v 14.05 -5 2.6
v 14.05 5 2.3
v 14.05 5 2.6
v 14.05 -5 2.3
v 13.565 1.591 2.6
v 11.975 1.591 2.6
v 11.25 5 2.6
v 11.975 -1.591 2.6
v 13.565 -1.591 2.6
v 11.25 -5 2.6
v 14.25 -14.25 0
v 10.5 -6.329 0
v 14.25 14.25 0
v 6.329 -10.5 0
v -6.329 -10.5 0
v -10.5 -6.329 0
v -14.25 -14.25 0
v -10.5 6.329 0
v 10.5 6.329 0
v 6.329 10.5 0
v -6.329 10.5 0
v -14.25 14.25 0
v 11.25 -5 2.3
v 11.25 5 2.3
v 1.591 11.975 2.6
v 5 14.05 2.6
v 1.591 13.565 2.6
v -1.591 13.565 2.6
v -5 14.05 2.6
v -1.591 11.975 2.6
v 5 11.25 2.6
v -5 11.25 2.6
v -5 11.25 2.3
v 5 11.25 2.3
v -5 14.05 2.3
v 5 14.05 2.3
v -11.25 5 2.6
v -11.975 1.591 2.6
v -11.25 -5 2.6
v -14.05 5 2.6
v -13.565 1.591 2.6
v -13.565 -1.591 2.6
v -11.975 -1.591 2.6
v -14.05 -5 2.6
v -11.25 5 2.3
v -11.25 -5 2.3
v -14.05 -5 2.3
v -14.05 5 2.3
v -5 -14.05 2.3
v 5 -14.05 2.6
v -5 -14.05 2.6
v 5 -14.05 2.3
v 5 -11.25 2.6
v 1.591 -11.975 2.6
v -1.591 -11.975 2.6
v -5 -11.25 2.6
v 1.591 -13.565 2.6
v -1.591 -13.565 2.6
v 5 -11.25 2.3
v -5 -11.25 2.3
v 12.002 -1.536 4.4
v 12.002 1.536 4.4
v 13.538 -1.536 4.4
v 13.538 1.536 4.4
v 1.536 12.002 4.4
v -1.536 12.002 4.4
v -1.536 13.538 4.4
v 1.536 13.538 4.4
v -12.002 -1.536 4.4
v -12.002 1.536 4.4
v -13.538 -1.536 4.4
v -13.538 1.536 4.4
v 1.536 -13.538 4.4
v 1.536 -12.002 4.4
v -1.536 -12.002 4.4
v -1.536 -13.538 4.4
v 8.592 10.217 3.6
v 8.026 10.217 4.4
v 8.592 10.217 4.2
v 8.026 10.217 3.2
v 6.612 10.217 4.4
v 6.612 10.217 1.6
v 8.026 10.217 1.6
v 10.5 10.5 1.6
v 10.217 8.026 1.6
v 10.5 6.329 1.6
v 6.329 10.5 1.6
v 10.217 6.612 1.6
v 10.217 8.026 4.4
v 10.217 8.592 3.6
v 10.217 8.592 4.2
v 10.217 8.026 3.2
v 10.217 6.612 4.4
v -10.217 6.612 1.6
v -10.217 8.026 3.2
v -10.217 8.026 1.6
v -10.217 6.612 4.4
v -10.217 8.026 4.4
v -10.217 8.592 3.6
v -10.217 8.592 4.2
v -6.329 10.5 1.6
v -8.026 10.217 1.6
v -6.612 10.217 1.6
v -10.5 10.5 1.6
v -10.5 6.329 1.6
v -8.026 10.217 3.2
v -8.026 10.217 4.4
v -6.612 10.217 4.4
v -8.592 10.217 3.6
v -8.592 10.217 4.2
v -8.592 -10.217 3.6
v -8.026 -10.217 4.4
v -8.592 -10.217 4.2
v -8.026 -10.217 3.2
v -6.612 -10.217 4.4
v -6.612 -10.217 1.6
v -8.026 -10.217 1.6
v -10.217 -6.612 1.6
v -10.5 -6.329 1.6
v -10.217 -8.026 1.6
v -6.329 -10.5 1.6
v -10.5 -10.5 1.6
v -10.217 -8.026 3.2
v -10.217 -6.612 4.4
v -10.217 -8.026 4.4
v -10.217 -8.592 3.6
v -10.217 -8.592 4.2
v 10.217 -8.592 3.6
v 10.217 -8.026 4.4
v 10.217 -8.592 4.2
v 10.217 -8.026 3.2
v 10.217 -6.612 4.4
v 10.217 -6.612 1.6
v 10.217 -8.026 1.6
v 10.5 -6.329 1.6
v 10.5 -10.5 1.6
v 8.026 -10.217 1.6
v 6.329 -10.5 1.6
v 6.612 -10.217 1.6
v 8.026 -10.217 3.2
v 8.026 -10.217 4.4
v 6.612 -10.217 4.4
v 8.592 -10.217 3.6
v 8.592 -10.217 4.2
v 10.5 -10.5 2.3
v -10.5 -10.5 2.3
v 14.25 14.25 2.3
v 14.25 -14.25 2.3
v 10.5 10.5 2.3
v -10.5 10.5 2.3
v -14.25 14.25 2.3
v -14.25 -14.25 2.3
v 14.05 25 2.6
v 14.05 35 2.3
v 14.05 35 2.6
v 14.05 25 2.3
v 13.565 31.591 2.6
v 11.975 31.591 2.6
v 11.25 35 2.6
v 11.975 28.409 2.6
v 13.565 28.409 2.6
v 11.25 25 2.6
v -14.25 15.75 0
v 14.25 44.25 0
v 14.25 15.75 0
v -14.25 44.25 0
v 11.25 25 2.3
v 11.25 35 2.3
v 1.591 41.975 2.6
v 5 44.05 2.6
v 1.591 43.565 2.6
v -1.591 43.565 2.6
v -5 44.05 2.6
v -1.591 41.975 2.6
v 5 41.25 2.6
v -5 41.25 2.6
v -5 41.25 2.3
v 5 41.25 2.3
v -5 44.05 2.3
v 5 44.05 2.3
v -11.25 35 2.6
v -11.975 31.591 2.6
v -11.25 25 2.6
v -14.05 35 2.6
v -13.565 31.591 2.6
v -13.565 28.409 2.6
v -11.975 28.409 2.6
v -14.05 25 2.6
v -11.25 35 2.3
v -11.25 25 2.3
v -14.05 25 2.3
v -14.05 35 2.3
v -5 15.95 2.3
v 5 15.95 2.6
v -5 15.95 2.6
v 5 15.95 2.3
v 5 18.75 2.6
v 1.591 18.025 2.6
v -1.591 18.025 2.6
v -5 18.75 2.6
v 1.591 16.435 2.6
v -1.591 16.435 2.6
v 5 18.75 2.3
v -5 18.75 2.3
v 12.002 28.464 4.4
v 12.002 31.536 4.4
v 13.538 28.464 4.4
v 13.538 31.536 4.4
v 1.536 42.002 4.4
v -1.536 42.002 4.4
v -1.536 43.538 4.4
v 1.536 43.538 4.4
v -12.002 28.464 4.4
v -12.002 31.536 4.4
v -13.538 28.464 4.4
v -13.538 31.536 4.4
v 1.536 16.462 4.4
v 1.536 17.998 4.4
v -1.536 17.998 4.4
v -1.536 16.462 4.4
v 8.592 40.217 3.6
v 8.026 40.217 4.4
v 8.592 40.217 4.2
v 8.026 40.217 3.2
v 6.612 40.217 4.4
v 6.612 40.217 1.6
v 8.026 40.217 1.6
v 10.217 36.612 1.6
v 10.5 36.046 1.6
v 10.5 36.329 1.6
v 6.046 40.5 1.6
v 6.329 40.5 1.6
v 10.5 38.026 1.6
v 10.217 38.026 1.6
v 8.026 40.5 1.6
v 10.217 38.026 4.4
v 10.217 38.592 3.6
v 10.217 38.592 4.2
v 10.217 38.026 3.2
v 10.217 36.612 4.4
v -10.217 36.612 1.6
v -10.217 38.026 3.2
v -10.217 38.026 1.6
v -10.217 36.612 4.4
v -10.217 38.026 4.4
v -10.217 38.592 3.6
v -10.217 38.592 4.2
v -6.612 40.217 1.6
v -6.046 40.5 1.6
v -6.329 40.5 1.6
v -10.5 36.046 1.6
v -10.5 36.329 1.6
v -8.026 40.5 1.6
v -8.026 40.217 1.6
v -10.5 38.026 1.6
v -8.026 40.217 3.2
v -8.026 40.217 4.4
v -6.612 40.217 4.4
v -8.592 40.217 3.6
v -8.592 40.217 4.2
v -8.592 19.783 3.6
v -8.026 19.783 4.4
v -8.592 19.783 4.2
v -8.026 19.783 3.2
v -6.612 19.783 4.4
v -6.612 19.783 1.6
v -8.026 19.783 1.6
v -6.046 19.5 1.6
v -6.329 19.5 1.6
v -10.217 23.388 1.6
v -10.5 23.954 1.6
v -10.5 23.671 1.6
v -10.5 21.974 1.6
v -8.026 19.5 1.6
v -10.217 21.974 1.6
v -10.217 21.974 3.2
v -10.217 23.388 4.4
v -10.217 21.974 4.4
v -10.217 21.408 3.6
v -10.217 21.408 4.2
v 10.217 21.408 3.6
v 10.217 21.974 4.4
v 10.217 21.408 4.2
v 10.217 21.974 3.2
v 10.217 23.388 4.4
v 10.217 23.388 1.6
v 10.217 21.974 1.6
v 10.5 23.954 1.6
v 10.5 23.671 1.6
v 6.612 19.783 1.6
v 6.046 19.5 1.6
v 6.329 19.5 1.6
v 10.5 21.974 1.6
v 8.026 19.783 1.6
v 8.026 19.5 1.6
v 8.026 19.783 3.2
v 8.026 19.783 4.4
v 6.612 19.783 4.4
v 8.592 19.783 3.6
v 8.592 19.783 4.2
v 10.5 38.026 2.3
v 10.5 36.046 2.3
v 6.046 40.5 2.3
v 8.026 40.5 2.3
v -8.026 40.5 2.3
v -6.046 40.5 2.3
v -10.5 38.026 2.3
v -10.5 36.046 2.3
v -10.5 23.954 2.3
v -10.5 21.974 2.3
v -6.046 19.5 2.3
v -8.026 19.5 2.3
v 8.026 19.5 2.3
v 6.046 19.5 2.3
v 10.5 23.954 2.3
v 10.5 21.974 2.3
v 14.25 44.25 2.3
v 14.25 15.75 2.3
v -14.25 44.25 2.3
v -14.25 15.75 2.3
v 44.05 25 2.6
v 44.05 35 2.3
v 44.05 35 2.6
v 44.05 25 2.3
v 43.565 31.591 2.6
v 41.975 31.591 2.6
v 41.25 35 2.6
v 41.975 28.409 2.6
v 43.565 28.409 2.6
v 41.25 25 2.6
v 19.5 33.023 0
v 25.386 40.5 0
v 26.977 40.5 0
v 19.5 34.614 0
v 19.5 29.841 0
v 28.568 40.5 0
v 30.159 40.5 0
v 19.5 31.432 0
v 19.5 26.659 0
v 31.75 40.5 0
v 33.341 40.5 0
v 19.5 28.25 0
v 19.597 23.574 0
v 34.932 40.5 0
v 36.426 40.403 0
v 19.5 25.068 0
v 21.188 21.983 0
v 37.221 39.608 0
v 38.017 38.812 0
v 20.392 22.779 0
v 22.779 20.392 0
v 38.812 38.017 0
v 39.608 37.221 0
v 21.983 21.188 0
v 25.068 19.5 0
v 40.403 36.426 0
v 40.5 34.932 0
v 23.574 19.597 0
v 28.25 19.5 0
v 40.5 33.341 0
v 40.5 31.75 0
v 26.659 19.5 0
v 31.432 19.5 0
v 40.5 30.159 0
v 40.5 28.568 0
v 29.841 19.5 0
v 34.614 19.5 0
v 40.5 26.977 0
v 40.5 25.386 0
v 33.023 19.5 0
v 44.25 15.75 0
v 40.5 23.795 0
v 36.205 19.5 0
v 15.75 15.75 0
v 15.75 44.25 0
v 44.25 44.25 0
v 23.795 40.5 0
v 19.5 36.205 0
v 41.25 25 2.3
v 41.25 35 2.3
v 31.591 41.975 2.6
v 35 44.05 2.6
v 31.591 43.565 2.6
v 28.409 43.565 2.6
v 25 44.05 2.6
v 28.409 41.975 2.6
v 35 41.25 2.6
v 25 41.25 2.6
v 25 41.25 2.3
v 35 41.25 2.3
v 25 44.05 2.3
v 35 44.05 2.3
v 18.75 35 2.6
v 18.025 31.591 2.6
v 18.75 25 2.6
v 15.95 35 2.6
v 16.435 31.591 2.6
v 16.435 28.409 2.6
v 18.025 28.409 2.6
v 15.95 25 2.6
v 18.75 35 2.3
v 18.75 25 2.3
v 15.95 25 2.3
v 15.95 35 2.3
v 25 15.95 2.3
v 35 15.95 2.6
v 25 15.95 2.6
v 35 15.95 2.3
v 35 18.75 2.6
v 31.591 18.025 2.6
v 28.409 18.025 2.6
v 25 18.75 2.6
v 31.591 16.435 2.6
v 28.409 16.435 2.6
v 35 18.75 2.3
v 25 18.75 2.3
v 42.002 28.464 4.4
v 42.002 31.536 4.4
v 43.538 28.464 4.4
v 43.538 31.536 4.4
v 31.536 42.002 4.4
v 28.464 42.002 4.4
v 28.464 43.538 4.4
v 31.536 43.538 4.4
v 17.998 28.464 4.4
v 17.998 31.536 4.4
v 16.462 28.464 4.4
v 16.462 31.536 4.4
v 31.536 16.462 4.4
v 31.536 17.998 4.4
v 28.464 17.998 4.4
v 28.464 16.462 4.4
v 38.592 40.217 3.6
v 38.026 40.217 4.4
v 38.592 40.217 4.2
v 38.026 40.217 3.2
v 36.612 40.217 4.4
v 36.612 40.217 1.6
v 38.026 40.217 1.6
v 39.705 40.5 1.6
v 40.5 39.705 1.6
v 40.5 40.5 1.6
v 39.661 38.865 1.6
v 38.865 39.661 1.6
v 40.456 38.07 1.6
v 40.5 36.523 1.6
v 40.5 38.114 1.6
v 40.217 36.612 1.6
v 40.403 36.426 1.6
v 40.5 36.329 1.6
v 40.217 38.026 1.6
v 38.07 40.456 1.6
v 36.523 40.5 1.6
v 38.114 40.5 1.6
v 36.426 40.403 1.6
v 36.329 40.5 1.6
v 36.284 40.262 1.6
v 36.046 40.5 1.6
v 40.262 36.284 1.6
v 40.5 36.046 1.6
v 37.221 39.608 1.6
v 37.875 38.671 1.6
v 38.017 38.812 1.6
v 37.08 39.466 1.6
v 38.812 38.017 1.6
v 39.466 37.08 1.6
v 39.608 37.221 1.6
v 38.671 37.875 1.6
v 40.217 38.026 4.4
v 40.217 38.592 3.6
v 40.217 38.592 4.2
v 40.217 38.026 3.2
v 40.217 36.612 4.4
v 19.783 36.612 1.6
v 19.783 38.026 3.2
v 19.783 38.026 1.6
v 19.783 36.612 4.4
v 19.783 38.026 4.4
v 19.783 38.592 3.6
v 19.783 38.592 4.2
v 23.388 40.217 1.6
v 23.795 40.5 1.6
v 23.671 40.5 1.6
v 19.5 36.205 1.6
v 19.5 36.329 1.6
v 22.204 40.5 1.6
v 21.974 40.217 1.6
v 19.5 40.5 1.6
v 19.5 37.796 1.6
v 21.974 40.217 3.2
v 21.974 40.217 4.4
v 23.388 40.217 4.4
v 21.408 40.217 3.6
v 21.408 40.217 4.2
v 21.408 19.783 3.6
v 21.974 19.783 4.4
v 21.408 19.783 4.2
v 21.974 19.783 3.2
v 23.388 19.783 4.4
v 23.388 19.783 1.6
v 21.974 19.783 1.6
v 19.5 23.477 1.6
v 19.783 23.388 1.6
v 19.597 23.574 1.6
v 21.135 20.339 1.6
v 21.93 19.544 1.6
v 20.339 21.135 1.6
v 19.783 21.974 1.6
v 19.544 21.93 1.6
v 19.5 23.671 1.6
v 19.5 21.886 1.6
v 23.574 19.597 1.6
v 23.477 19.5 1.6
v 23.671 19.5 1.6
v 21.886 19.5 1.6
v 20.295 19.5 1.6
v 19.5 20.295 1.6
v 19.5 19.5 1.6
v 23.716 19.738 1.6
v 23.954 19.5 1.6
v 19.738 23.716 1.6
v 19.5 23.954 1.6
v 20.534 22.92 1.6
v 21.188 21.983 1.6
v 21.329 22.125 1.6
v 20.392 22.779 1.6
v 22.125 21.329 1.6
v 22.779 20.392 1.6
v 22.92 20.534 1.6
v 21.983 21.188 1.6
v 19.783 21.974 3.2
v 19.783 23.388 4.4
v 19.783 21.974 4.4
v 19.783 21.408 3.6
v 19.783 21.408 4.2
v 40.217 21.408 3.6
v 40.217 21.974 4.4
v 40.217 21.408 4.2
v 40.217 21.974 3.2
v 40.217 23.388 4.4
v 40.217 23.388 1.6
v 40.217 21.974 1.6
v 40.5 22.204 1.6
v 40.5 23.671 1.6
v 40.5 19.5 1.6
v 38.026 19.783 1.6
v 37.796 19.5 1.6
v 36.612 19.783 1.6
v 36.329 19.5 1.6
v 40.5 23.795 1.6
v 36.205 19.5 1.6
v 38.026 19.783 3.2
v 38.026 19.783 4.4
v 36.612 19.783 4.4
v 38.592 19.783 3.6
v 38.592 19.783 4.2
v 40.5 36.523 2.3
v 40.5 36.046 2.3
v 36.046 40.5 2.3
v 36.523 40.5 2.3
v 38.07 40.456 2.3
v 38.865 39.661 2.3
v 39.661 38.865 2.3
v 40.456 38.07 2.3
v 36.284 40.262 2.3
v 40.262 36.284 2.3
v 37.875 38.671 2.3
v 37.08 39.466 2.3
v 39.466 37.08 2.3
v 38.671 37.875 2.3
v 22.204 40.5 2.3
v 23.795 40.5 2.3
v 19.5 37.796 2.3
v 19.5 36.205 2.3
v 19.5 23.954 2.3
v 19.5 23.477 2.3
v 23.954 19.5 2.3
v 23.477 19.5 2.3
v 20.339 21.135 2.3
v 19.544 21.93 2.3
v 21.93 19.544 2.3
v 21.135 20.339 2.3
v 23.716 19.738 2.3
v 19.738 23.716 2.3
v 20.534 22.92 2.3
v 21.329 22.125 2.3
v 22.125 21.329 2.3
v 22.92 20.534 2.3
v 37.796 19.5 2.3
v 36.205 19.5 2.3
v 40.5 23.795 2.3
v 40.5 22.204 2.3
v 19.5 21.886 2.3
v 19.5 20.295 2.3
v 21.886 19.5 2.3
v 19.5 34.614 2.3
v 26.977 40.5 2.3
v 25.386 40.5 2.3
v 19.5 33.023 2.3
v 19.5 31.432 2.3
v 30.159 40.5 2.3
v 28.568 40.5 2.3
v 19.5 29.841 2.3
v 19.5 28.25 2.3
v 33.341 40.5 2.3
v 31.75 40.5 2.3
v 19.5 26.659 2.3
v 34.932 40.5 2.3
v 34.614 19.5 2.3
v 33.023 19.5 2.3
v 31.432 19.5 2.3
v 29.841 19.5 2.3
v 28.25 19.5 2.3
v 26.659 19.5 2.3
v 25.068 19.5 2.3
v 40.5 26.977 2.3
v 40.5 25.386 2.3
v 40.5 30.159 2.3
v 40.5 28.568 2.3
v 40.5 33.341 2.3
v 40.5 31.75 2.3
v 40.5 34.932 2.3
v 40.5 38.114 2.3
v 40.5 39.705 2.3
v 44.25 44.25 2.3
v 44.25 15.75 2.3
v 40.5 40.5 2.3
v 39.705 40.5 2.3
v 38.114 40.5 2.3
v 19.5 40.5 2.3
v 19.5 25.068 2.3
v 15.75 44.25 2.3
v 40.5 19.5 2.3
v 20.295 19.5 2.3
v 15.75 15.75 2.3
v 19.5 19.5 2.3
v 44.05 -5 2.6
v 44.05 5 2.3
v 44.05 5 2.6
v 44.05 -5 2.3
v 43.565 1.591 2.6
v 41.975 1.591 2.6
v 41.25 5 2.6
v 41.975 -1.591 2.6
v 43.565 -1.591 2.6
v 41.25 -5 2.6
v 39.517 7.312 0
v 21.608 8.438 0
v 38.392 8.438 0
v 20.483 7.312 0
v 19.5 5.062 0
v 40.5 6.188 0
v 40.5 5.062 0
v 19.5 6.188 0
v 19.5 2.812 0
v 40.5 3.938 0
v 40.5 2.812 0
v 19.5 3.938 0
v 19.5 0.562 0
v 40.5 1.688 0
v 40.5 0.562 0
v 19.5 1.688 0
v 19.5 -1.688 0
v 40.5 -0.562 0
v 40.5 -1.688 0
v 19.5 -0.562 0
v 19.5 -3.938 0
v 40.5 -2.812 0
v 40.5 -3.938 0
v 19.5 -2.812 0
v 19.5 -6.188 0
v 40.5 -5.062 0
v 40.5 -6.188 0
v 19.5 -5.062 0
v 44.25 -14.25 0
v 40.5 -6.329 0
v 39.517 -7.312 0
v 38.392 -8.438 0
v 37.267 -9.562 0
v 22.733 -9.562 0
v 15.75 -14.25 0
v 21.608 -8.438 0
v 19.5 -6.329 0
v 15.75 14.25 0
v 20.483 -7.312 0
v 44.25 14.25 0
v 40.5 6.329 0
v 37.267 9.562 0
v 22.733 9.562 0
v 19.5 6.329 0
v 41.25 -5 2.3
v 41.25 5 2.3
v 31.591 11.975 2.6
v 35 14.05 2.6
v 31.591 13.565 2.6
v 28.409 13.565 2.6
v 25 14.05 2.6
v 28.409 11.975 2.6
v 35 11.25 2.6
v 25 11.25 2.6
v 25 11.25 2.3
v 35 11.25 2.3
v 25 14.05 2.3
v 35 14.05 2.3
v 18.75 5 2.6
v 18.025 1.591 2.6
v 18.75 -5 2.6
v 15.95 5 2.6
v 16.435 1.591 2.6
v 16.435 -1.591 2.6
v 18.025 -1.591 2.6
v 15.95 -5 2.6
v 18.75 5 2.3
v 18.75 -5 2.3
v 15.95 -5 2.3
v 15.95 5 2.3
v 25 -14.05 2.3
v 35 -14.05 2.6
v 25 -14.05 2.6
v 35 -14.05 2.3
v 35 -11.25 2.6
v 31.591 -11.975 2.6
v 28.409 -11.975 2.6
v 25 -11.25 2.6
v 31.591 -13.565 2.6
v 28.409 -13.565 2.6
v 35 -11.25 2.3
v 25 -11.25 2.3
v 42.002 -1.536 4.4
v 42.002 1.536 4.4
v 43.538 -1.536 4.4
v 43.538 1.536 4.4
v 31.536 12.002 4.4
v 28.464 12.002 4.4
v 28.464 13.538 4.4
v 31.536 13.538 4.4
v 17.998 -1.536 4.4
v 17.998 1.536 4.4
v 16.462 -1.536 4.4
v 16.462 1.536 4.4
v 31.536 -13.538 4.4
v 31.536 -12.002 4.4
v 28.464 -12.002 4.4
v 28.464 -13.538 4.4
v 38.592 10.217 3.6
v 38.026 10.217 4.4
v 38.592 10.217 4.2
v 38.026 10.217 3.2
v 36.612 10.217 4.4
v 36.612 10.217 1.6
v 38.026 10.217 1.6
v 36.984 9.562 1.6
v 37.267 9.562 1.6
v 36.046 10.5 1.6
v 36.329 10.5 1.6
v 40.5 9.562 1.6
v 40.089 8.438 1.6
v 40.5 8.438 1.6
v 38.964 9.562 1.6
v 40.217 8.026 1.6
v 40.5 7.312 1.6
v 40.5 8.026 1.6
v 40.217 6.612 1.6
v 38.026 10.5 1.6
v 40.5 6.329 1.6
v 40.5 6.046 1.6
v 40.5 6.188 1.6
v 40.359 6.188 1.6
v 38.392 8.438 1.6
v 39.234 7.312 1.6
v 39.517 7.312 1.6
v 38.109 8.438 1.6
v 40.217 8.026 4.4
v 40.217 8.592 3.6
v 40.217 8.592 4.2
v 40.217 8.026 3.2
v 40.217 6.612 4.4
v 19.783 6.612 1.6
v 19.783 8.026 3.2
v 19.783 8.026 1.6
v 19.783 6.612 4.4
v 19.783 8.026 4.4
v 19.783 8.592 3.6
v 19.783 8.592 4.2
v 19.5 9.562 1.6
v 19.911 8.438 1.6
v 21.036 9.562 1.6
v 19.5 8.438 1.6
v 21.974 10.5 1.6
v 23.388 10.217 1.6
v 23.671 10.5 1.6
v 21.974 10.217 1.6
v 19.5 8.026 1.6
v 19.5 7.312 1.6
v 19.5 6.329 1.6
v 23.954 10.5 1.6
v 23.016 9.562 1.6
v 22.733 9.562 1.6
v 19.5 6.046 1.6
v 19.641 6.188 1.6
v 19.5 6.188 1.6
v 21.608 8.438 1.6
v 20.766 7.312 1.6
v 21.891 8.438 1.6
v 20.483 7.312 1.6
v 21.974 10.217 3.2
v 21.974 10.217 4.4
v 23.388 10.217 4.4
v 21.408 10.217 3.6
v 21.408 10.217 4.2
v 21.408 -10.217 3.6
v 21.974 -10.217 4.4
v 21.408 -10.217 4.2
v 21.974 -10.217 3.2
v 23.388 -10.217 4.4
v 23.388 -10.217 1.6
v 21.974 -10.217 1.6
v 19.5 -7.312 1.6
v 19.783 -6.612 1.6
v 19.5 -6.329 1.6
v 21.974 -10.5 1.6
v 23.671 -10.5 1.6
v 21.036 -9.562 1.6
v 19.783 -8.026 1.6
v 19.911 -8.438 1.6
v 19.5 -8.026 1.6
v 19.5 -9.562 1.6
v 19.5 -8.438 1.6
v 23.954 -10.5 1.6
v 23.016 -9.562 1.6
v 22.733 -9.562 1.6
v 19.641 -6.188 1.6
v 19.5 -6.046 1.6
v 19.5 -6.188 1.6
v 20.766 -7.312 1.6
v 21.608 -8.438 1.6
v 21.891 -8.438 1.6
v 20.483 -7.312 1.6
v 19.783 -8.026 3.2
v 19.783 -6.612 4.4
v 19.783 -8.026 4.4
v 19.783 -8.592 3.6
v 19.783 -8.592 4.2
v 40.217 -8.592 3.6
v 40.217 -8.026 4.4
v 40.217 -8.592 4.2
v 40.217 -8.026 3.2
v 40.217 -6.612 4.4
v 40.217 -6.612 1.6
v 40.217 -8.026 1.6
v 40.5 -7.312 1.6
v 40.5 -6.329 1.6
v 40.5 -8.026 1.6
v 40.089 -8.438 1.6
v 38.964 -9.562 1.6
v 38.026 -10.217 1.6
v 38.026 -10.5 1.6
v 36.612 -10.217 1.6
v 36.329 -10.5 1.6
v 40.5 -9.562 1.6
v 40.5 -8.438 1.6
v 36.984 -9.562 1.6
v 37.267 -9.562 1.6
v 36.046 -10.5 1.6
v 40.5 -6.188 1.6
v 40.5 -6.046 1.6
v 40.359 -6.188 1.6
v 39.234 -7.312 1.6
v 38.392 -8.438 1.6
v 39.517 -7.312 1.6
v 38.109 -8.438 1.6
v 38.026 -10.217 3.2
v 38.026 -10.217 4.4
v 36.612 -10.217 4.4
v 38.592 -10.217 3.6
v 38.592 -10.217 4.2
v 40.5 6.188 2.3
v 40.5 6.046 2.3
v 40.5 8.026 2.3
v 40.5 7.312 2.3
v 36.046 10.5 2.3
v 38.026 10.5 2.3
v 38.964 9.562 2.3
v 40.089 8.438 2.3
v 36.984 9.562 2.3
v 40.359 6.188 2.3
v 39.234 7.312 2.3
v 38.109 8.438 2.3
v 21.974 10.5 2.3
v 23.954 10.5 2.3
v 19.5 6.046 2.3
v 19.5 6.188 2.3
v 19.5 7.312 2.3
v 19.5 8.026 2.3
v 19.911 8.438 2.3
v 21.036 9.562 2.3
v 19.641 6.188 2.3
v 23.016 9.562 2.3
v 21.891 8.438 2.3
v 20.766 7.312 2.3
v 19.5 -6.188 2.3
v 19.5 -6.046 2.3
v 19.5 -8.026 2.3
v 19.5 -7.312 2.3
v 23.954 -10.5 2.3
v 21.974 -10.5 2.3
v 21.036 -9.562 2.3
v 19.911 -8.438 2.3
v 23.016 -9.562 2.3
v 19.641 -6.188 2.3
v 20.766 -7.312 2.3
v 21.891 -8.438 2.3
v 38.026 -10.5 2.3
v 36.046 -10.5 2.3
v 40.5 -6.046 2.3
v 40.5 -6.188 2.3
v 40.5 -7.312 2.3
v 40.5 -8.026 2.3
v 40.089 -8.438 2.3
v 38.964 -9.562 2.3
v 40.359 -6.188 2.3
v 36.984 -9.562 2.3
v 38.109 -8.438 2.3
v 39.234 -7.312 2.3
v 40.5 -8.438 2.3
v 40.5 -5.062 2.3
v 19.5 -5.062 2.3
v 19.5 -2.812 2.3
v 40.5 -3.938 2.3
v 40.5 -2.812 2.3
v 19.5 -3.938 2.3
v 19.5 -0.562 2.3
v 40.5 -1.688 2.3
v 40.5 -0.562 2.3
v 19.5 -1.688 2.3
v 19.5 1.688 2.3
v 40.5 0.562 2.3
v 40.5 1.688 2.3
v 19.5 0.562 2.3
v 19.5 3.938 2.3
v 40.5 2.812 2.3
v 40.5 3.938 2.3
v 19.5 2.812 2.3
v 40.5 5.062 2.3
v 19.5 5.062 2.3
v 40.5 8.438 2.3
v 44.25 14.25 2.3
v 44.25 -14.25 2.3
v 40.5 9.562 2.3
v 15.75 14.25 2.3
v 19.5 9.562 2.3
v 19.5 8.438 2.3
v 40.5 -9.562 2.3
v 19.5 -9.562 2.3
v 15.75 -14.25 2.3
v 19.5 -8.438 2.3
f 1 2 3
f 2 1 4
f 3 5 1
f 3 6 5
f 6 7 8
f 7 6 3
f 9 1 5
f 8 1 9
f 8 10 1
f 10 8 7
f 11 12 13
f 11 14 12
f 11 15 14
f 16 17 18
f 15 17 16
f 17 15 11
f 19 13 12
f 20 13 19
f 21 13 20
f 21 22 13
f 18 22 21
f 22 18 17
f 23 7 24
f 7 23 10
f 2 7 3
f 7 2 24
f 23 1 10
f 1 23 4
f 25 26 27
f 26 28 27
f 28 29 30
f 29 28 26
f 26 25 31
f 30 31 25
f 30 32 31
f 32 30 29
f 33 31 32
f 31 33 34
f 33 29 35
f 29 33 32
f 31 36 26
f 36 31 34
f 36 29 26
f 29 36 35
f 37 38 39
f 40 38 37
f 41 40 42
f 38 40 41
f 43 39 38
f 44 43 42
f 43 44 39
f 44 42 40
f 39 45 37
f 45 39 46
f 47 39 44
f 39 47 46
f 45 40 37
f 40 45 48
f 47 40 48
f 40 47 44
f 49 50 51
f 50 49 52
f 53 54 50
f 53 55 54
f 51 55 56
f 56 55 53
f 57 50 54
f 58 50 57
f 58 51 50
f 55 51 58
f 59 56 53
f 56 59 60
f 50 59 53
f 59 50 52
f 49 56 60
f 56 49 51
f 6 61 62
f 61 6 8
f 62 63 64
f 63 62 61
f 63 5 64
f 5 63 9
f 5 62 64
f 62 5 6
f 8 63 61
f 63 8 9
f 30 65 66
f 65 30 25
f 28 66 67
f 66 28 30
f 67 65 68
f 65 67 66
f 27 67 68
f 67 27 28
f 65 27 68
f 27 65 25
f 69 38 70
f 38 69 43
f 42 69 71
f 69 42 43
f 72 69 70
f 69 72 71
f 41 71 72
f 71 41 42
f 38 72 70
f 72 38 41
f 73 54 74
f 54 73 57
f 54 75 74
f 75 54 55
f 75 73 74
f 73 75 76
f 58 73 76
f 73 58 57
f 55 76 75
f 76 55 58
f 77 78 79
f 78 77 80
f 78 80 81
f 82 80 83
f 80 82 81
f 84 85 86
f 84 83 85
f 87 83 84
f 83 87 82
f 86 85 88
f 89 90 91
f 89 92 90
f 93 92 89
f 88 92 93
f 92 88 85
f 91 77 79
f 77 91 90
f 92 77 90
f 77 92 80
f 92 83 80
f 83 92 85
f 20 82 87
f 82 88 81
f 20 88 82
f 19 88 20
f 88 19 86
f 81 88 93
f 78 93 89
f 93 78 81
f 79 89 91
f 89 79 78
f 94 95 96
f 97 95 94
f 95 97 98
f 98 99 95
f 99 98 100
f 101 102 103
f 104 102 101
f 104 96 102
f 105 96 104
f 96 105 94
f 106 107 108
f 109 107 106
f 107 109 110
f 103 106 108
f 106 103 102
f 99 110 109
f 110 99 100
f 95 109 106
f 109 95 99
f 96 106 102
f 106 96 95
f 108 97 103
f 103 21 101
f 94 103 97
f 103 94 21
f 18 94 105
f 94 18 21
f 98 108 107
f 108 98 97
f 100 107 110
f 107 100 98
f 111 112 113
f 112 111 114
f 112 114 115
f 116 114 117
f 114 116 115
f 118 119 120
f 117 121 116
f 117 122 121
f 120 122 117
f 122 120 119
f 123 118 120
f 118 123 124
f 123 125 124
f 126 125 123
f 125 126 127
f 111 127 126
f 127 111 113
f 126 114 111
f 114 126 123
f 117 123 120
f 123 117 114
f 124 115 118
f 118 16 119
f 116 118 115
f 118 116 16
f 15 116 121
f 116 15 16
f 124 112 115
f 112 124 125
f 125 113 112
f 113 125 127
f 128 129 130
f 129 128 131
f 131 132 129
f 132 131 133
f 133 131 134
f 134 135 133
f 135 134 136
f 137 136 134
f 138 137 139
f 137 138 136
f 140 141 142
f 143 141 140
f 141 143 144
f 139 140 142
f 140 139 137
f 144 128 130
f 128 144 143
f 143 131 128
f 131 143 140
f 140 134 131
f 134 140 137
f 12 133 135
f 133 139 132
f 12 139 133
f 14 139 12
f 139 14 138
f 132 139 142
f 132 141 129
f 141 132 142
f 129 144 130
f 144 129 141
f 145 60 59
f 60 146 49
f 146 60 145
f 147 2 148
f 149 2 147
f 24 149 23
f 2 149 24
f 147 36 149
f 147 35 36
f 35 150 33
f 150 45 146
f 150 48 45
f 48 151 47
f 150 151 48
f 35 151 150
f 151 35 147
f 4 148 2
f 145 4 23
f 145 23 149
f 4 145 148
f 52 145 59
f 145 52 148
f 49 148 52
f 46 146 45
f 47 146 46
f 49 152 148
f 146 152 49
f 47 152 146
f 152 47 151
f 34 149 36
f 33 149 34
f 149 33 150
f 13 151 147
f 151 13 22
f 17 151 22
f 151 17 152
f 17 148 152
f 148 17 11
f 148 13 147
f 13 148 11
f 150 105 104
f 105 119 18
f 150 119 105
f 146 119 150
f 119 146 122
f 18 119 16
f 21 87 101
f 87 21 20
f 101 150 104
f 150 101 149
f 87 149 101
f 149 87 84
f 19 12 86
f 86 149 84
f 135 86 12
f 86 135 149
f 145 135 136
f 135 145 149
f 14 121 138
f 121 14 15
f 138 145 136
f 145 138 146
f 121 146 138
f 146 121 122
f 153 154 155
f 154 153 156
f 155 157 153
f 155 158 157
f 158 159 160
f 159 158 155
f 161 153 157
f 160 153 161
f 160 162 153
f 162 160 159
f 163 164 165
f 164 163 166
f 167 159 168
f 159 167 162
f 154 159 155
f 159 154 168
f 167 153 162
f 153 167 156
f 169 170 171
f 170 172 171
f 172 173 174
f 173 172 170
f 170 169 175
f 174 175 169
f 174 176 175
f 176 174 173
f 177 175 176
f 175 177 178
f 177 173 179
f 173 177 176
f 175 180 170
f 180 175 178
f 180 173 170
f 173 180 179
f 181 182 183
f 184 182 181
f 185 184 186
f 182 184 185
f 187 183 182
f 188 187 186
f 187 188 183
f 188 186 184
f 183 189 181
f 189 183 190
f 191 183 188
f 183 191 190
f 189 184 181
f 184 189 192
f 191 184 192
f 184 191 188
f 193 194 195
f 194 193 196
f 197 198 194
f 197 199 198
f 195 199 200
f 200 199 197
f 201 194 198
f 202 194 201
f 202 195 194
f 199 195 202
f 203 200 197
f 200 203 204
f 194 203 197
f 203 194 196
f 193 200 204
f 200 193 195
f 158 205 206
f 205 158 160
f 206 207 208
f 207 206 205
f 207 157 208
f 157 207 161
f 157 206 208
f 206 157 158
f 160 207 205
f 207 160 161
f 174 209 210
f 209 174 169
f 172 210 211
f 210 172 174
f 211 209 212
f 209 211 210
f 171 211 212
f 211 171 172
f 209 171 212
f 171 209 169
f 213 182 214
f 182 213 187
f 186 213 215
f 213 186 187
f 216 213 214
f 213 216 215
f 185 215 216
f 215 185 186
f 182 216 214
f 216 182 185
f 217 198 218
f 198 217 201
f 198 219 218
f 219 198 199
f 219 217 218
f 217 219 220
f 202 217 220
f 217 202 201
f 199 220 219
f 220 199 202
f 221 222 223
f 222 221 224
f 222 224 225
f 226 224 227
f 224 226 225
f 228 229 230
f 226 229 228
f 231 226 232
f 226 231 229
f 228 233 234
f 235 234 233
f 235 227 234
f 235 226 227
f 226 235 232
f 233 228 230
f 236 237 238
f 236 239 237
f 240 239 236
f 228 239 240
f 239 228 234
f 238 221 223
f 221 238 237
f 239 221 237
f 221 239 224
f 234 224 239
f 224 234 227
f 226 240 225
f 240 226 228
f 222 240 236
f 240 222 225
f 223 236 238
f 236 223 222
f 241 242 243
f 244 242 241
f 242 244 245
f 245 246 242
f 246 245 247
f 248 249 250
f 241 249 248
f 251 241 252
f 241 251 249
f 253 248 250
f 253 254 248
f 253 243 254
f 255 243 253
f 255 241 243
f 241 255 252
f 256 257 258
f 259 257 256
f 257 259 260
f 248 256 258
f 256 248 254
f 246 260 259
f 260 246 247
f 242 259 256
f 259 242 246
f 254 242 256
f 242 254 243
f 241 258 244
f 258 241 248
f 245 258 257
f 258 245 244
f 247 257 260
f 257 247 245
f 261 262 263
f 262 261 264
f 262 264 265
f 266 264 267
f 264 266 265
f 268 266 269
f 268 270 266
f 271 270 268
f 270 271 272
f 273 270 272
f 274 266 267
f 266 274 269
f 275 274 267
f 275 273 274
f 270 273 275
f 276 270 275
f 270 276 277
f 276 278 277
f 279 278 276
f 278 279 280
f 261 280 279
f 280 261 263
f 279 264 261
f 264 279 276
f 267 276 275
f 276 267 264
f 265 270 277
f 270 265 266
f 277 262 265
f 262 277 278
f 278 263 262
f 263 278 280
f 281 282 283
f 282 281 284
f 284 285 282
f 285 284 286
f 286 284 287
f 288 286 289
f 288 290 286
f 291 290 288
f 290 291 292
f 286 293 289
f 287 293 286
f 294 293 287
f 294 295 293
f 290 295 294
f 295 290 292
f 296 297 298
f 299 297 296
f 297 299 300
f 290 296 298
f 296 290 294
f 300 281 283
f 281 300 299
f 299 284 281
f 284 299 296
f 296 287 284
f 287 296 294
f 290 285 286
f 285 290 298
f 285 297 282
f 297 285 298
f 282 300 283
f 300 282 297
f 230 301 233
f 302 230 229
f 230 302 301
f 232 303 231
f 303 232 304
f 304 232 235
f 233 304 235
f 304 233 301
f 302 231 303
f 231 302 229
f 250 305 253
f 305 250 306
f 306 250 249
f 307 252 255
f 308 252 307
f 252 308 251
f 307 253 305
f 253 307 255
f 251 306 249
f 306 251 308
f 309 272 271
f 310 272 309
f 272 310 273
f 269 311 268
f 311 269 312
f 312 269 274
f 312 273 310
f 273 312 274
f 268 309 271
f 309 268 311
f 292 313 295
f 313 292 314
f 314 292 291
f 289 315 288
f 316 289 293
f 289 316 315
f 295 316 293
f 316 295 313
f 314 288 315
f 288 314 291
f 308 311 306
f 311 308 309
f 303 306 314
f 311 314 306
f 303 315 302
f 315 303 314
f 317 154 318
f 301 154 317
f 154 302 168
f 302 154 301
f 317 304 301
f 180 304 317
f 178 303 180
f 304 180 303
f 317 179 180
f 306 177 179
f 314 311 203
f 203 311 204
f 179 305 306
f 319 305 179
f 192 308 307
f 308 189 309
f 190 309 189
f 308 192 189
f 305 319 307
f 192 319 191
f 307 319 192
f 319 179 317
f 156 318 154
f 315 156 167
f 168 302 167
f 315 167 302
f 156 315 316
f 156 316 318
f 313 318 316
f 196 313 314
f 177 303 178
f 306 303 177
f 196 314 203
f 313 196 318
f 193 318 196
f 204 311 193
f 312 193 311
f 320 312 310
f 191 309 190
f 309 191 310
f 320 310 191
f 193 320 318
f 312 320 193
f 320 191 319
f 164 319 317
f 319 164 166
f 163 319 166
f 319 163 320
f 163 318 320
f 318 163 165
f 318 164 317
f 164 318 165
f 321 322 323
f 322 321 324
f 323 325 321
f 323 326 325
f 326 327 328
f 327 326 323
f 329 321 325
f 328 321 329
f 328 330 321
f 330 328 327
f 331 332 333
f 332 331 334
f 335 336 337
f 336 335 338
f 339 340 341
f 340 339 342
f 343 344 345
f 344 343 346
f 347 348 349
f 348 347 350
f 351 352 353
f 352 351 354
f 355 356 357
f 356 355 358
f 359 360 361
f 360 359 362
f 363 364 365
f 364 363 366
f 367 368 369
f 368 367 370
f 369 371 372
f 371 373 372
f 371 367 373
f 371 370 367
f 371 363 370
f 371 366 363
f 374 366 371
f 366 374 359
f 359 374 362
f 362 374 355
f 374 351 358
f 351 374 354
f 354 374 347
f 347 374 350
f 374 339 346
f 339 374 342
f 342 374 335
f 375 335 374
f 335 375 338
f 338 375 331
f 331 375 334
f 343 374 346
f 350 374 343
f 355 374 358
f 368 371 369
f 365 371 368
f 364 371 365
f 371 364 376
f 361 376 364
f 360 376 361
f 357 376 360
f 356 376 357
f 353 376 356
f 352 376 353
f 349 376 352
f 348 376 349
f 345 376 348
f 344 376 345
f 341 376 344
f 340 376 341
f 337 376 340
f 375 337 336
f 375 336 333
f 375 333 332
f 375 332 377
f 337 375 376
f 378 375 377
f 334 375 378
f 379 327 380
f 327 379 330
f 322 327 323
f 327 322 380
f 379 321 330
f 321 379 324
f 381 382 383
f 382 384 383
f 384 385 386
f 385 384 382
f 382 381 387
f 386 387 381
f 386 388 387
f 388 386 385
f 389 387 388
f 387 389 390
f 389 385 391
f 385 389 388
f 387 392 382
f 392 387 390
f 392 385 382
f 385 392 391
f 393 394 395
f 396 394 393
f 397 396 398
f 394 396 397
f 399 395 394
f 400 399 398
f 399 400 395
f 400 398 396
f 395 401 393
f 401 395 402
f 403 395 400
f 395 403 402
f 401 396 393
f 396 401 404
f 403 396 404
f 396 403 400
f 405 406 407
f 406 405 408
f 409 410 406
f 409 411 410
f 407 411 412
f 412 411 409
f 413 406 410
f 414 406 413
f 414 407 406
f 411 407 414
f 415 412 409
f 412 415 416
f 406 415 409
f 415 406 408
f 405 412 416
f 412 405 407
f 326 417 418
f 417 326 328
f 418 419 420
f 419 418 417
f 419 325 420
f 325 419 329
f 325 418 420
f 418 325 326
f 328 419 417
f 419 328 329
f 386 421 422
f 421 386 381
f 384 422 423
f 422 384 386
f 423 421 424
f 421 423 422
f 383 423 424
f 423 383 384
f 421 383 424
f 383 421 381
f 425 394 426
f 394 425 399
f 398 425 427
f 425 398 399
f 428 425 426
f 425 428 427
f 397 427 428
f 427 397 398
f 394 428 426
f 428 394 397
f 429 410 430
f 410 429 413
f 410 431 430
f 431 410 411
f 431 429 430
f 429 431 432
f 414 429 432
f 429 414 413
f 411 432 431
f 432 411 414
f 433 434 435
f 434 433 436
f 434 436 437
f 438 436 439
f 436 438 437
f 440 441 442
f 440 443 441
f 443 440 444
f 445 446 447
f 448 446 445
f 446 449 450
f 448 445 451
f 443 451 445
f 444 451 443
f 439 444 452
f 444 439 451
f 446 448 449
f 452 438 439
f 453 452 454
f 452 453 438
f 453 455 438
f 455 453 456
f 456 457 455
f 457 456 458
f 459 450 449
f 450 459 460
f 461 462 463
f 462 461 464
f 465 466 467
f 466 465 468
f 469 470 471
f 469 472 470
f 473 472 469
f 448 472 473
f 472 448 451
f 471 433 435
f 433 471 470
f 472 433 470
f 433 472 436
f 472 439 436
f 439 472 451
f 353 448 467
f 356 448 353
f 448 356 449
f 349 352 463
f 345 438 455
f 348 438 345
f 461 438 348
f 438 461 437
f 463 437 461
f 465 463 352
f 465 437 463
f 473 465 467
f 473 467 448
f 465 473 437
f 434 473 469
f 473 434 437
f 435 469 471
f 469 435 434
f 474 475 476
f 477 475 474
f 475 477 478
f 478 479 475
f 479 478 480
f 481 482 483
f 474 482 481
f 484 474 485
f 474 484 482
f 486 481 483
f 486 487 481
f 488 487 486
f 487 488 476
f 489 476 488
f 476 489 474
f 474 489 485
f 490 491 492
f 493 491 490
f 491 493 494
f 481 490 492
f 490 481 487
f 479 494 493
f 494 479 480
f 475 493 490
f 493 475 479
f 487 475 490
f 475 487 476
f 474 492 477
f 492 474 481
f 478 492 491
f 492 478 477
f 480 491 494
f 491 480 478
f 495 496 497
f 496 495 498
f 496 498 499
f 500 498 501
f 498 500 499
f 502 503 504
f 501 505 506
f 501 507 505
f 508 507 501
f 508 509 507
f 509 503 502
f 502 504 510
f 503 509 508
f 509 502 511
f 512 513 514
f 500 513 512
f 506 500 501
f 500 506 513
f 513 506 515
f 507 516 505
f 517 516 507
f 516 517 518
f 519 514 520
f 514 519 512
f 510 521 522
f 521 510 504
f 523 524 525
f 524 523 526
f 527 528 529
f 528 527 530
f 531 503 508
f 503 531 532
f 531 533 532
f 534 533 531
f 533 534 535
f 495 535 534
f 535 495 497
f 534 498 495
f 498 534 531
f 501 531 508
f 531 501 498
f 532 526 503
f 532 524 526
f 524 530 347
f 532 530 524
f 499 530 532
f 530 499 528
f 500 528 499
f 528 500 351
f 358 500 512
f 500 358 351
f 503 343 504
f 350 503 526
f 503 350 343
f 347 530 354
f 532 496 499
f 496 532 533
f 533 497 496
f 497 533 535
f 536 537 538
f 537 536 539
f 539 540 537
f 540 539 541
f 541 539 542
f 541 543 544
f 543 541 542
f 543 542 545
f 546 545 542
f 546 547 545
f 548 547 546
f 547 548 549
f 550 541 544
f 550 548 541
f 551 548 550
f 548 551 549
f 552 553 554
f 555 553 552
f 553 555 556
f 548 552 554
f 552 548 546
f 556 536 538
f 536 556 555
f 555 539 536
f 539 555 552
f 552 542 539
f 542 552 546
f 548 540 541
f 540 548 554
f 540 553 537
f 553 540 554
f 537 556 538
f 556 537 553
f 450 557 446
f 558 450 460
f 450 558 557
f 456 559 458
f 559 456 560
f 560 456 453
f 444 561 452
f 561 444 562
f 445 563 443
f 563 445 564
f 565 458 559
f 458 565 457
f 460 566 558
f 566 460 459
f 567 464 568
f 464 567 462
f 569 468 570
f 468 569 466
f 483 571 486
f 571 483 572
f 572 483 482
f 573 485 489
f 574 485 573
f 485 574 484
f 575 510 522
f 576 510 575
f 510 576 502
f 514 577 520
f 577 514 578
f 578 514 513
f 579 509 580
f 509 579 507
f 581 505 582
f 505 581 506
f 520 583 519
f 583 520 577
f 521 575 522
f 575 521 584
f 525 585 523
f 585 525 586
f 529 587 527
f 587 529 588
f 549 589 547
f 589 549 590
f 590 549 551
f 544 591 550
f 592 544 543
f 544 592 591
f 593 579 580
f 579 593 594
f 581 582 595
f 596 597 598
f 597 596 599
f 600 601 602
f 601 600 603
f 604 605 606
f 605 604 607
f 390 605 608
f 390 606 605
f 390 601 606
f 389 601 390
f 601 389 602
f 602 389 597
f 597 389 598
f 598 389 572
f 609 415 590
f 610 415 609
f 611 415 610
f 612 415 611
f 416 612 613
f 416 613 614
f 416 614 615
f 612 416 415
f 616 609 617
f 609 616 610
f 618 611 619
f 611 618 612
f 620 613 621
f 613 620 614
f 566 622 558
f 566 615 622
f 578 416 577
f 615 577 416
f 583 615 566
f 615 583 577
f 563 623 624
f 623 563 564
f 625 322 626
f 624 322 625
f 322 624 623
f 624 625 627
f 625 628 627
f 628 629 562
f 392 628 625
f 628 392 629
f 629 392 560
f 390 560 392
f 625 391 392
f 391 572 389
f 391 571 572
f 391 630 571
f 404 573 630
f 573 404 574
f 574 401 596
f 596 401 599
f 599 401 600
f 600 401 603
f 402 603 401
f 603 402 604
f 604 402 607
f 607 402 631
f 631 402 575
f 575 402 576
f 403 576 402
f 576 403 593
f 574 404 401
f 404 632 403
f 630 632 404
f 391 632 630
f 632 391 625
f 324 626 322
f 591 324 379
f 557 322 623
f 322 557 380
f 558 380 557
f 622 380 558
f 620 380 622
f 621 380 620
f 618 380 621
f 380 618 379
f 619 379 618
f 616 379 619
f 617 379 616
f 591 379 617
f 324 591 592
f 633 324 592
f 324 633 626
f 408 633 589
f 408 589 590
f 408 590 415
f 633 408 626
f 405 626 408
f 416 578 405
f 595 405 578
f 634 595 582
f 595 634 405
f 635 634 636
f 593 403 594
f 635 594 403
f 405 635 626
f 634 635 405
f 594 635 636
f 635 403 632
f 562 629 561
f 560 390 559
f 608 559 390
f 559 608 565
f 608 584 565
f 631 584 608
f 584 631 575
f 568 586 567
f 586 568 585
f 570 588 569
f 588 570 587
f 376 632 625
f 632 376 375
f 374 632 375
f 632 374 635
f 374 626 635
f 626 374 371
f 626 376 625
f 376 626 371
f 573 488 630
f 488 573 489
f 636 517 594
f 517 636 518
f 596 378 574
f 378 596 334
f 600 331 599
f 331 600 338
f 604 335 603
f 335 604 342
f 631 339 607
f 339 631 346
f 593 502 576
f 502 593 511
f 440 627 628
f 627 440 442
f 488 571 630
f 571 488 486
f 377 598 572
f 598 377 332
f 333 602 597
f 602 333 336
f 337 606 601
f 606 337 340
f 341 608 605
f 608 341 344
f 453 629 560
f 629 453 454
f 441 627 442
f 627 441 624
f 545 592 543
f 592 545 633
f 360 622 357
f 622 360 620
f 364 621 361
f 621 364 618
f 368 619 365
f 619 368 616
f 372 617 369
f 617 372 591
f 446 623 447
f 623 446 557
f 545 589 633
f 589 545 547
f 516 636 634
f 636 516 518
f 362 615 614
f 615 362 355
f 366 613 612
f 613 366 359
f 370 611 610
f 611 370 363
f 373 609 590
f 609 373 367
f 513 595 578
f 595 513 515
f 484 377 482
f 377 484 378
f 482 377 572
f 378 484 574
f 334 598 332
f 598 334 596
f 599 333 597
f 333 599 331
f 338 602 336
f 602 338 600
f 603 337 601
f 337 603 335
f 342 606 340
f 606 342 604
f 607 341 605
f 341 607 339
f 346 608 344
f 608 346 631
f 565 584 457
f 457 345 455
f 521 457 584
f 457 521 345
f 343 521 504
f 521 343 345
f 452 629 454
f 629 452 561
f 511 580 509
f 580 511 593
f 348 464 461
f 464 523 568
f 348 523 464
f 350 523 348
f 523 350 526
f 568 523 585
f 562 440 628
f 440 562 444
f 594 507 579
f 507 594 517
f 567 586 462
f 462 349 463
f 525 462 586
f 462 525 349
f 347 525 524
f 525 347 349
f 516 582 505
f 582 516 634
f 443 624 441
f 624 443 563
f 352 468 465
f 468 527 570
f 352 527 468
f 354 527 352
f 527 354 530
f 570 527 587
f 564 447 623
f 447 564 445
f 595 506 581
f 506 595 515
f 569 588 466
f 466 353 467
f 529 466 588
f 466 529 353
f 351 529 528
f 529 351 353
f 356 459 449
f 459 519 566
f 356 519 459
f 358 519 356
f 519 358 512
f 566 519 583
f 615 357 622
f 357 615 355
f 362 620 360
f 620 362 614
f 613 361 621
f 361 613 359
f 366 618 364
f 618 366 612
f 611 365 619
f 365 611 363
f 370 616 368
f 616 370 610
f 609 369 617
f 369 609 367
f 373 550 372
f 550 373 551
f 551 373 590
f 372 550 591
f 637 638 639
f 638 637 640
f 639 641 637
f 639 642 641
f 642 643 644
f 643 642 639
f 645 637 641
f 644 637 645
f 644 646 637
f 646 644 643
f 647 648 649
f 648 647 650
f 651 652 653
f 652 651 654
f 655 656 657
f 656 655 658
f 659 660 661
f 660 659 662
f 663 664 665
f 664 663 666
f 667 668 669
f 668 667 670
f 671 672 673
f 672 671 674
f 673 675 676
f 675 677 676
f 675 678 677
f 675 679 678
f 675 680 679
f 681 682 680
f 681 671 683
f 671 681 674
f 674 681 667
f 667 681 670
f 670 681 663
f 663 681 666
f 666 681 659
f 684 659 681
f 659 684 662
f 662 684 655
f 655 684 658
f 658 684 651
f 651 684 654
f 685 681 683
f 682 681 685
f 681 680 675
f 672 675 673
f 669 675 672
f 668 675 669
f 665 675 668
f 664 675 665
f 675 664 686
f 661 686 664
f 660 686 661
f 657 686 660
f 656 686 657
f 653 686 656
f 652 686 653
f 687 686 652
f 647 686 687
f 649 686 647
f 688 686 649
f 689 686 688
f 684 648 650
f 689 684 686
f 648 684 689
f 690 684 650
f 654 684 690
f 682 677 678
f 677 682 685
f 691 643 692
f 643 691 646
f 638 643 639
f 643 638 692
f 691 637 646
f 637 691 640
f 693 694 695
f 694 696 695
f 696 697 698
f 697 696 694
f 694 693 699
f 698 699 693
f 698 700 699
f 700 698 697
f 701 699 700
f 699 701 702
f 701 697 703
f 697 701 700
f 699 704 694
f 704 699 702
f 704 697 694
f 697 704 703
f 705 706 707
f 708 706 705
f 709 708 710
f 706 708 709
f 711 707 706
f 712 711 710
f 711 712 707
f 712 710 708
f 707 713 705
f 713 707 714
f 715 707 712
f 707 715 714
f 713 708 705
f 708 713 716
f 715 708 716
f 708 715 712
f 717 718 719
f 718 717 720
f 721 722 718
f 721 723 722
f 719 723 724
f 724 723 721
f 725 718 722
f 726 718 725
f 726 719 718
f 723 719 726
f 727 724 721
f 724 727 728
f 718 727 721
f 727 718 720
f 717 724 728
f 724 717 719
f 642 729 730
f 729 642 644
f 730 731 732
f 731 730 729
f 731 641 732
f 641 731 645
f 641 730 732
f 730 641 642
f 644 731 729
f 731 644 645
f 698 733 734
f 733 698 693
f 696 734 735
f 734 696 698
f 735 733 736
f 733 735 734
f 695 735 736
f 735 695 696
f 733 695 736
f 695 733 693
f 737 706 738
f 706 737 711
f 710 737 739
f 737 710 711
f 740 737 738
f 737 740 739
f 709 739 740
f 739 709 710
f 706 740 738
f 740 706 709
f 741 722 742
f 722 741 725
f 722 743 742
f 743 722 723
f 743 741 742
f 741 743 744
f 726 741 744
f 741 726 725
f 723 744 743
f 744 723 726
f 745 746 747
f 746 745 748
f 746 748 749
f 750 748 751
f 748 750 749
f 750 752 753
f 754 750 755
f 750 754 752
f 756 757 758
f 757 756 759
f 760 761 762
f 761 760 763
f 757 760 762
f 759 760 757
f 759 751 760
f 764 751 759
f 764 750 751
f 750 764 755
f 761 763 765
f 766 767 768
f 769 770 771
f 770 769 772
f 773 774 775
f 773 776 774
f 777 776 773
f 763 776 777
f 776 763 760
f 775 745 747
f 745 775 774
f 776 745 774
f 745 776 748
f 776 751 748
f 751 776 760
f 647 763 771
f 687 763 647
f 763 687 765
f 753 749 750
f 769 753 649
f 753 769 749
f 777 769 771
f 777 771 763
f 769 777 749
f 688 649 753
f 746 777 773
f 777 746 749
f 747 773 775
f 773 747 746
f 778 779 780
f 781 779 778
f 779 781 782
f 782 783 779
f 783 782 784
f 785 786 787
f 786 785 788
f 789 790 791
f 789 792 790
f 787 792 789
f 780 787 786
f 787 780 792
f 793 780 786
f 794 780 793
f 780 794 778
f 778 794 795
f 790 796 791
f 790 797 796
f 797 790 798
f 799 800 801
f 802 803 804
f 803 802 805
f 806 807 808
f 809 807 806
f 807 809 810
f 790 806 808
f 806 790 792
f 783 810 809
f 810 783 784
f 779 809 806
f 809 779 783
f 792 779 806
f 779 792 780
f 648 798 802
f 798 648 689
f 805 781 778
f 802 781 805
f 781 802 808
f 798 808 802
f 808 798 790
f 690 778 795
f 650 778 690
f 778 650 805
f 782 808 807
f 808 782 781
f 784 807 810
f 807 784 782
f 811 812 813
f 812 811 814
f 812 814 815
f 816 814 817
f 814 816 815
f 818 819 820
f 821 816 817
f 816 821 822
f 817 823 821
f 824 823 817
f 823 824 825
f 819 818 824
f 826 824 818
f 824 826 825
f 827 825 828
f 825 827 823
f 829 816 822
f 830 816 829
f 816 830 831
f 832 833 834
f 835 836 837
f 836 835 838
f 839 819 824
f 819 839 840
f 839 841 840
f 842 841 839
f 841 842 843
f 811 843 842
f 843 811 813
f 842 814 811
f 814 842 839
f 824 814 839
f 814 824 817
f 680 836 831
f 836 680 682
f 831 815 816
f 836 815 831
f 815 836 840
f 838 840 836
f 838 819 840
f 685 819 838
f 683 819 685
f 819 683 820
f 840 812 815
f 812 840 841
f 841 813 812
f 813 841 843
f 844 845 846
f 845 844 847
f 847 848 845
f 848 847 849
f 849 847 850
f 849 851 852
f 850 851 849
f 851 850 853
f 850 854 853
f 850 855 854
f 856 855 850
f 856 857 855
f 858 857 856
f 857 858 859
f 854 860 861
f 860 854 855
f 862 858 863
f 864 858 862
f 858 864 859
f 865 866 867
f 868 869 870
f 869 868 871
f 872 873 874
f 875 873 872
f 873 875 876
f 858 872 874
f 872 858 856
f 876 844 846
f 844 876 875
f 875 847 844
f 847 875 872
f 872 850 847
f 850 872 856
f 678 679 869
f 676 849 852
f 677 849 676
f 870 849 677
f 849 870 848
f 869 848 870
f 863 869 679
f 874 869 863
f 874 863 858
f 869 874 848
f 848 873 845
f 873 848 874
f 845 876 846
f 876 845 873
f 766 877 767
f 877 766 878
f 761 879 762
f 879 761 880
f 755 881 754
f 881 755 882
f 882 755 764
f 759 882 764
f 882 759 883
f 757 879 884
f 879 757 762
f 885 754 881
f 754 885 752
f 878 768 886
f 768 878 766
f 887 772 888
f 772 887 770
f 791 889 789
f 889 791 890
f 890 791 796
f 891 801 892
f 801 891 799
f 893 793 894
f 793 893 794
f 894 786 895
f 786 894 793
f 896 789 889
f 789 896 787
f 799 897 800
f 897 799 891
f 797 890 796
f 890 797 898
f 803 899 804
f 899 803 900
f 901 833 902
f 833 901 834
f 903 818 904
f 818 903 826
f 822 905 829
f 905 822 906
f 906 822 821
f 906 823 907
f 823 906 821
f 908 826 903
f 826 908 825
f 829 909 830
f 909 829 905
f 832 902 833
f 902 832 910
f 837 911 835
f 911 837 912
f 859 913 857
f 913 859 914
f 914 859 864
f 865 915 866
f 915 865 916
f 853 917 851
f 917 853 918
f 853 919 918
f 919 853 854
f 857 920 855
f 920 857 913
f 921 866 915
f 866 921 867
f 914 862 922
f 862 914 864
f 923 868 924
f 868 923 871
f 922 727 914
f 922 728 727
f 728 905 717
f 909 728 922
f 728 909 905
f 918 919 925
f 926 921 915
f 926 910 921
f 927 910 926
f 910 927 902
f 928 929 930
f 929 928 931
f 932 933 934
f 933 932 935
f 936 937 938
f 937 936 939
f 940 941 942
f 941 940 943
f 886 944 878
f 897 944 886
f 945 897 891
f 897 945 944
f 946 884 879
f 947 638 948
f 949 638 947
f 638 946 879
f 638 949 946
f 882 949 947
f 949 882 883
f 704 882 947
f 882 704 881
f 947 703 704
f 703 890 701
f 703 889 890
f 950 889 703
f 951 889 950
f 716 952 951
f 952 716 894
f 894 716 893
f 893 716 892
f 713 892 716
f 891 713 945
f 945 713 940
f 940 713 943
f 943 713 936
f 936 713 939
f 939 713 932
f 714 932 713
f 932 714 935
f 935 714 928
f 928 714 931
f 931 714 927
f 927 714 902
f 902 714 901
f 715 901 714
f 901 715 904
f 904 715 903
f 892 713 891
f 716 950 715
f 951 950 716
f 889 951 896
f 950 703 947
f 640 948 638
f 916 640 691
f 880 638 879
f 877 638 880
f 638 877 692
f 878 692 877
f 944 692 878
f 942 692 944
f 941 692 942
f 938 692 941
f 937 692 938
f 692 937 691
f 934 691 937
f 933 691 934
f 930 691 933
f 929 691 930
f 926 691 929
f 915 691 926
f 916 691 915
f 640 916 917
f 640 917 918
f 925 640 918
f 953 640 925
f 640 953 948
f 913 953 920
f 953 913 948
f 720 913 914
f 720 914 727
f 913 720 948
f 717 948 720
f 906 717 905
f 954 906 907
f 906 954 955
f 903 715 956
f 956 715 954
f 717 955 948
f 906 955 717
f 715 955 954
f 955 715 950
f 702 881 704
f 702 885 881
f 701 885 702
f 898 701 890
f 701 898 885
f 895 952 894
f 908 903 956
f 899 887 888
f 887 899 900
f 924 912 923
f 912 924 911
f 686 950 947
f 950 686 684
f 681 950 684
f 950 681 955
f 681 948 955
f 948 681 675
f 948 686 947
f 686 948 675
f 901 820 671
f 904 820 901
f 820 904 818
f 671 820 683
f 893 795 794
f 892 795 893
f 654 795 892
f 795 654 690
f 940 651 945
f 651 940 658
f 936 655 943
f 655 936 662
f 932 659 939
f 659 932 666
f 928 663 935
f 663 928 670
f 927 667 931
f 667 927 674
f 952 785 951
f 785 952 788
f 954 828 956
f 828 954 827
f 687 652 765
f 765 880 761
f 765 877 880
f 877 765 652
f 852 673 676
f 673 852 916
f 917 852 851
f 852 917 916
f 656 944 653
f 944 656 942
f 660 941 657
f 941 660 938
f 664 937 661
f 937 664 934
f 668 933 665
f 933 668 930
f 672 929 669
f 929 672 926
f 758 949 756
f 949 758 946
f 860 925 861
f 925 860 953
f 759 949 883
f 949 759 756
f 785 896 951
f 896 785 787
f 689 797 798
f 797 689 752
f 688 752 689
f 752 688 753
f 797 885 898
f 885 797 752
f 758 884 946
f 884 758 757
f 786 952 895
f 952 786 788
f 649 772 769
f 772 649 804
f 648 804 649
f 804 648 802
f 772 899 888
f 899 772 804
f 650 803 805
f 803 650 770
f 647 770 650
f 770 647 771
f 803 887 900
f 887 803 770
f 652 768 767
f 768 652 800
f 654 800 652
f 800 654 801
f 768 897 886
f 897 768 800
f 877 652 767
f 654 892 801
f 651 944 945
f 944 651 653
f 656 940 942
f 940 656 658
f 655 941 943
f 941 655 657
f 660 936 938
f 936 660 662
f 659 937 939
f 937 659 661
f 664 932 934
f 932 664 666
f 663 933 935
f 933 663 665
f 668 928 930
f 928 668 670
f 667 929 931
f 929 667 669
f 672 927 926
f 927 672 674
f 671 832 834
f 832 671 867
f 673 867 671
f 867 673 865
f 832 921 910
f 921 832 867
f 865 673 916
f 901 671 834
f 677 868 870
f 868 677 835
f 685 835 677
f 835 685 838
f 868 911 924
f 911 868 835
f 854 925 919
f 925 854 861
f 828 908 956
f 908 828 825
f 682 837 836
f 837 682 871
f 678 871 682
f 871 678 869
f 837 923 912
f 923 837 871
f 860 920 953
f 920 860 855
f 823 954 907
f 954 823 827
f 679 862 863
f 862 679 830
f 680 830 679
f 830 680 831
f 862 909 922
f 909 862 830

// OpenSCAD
// Copyright 2025 - Marcin Raczkowski (Marmot.Tech)
//
// Licence: https://creativecommons.org/licenses/by-sa/4.0/
//
// Reference/Specs: https://github.com/FrameworkComputer/Framework-Desktop/blob/main/Tiles/FRAMEWORK_DESKTOP_BLANK_TILE_V0.pdf

/* [General] */

// What element to display
tile_type = "all"; // ["all", "blank", "horizontal", "cross", "frame", "mounts (debug)"]
// Colorize elements (preview only)
$colorize_elements = true;
// Tolerance [mm]
tolerance = 0.4;
// Hatch Angle [deg]
hatch_angle = 45;
// Hatch Line Thickness [mm]
hatch_thickness = 1.125;

/* [Specification (Avoid Changing)] */

// Front Thickness [mm]
front_thickness = 2.3; // .1
// Frame Thickness [mm]
frame_thickness = 2.3;
// Inner Size
inner_size = 21.0;

// Width/Height of the singular tile [mm]
tile_size = 28.5;

// All height measurements are from the base

raised_edge_size = [2.8, 10.0, 2.6];

constraint_size = [1.6, 3.2, 4.4];
constraint_offset = 11.97;
constraint_slope = 0.96; //0.01

hook_size   = [1.0, 6.0, 4.4];
hook_offset = 12.90;
hook_base   = [3.2, 1.6];
hook_thickness = 0.4;

/* [Hidden] */

$ff = 0.02; // fudge factor - to fix any rendering issues
width = tile_size - tolerance;
height = tile_size - tolerance;
trim = inner_size/2;

module part_color(c) {
  if ($preview && $colorize_elements) {
    color(c) children();
  } else children();
}

module raised_edges() {
  for(r = [0:3]) {
    rotate([0,0,90*r])
      translate([(width - raised_edge_size[0]) / 2, 0, raised_edge_size[2]/2])
        cube(raised_edge_size, center=true);
    ;
  }
}

module constraints(base = frame_thickness) {
  for(r = [0:3]) {
    rotate([0,0,90*r])
      translate([constraint_offset + constraint_size[0]/2, 0, base])
        linear_extrude(constraint_size[2]-base, scale=constraint_slope)
        square([constraint_size[0], constraint_size[1]], center=true);
    ;
  }
}

module hooks(w=hook_thickness, h=1.2, trim_margin = tolerance) {
  hd = hook_size[0];
  hw = hook_size[1];
  hh = hook_size[2];
  
  bw = hook_base[0];
  bh = hook_base[1];
  
  hook_profile = [
    [0, 0],   // top middle
    [w, w/2],   // hook top
    [w, h-w],
    [0, h],   // hook bottom
    [0, hh],  // bottom front
    [-hd, hh], // top back
    [-hd, 0], // top back
  ];
  
  part_color("red") for(r = [0:3])
    rotate([0, 0, 45 + 90*r]) {
      intersection(){
        // Cube that trims the hook to the inner edge of the frame
        translate([(inner_size-trim)*sqrt(2)/2-trim_margin, 0, bh+trim/2])
          rotate([0, 0, 45]) cube(trim, center=true);
        // Hook shape
        translate([hook_offset, 0, hook_size[2]])
          rotate([-90, 0, 0]) 
            linear_extrude(hook_size[1], center=true) 
              polygon(hook_profile);
      }
        // Base to attach to frame
      translate([hook_offset-hd, -hw/2, 0])
        cube([bw+hd, hw, bh]);
    }
}

// Cutout around the neck of the hook that coerces the slicer 
// to generate stronger borders / walls around the hook neck.
module hook_cutout(b=hook_base[1]) {
  trim_margin = 0;
  h = hook_size[2] - b;
  
  for(r = [0:3])
    rotate([0, 0, 45 + 90*r])
      intersection(){
        // Cube that trims the hook to the inner edge of the frame
        translate([(inner_size-trim)*sqrt(2)/2-trim_margin, 0, b+trim/2])
          rotate([0, 0, 45]) cube(trim, center=true);
        translate([hook_offset - hook_size[0]/2, 0, b+h/2])
          cube([hook_size[0]+tolerance, hook_size[1]+tolerance, h], center=true);
      }
}


module frame() {
  difference() { 
    linear_extrude(frame_thickness) 
      difference() {
        square(tile_size, center=true);
        square(inner_size, center=true);
      }
    hook_cutout();
  }
}

module solid_fill() {
  difference() {
    linear_extrude(front_thickness)
      square(inner_size, center=true);
    hook_cutout();
  }
}


module crosshatch_fill(angle = hatch_angle, thickness = hatch_thickness) {
  n = ceil(inner_size / thickness / 2)+1;
  difference() {
    linear_extrude(front_thickness) intersection() {
      square(inner_size, center=true);
      
      union() for(i = [n/-2:n/2]) {
        rotate([0, 0, angle]) translate([0, thickness*2*i])
          square([inner_size * 2, thickness], center=true);
      }
    }
    
    hook_cutout();
  }
}

module horizontal_fill() {
  crosshatch_fill(0);
}


/* --- */

module mounts() {
  part_color("maroon") raised_edges();
  part_color("orange") constraints();
  part_color("red")    hooks();
}

module full_frame() {
  mounts();
  part_color("blue")   frame();
}

module blank_tile() {
  full_frame();
  solid_fill();
}

if (tile_type == "all") {
  translate([ 0,  0, 0]) { full_frame(); }
  translate([ 0, 30, 0]) { full_frame(); solid_fill(); }
  translate([30, 30, 0]) { full_frame(); crosshatch_fill(); }
  translate([30,  0, 0]) { full_frame(); horizontal_fill(); }
} else if (tile_type == "mounts") {
  mounts();
} else if (tile_type == "frame") {
  full_frame();
} else if (tile_type == "blank") {
  blank_tile();
} else if (tile_type == "cross") {
  full_frame();
  crosshatch_fill();
} else if (tile_type == "horizontal") {
  full_frame();
  horizontal_fill();
};


/*
 * Usage:
 *
 * include <tile_base.scad>
 * tile_type = "none";
 * $colorize_parts = false;
 *
 * union() {
 *   full_frame(); // (or just mounts())
 *   my_design();
 * }
 *
 * // or
 *
 * difference(){
 *   blank_tile();
 *   carve_out();
 * }
 *
 */
